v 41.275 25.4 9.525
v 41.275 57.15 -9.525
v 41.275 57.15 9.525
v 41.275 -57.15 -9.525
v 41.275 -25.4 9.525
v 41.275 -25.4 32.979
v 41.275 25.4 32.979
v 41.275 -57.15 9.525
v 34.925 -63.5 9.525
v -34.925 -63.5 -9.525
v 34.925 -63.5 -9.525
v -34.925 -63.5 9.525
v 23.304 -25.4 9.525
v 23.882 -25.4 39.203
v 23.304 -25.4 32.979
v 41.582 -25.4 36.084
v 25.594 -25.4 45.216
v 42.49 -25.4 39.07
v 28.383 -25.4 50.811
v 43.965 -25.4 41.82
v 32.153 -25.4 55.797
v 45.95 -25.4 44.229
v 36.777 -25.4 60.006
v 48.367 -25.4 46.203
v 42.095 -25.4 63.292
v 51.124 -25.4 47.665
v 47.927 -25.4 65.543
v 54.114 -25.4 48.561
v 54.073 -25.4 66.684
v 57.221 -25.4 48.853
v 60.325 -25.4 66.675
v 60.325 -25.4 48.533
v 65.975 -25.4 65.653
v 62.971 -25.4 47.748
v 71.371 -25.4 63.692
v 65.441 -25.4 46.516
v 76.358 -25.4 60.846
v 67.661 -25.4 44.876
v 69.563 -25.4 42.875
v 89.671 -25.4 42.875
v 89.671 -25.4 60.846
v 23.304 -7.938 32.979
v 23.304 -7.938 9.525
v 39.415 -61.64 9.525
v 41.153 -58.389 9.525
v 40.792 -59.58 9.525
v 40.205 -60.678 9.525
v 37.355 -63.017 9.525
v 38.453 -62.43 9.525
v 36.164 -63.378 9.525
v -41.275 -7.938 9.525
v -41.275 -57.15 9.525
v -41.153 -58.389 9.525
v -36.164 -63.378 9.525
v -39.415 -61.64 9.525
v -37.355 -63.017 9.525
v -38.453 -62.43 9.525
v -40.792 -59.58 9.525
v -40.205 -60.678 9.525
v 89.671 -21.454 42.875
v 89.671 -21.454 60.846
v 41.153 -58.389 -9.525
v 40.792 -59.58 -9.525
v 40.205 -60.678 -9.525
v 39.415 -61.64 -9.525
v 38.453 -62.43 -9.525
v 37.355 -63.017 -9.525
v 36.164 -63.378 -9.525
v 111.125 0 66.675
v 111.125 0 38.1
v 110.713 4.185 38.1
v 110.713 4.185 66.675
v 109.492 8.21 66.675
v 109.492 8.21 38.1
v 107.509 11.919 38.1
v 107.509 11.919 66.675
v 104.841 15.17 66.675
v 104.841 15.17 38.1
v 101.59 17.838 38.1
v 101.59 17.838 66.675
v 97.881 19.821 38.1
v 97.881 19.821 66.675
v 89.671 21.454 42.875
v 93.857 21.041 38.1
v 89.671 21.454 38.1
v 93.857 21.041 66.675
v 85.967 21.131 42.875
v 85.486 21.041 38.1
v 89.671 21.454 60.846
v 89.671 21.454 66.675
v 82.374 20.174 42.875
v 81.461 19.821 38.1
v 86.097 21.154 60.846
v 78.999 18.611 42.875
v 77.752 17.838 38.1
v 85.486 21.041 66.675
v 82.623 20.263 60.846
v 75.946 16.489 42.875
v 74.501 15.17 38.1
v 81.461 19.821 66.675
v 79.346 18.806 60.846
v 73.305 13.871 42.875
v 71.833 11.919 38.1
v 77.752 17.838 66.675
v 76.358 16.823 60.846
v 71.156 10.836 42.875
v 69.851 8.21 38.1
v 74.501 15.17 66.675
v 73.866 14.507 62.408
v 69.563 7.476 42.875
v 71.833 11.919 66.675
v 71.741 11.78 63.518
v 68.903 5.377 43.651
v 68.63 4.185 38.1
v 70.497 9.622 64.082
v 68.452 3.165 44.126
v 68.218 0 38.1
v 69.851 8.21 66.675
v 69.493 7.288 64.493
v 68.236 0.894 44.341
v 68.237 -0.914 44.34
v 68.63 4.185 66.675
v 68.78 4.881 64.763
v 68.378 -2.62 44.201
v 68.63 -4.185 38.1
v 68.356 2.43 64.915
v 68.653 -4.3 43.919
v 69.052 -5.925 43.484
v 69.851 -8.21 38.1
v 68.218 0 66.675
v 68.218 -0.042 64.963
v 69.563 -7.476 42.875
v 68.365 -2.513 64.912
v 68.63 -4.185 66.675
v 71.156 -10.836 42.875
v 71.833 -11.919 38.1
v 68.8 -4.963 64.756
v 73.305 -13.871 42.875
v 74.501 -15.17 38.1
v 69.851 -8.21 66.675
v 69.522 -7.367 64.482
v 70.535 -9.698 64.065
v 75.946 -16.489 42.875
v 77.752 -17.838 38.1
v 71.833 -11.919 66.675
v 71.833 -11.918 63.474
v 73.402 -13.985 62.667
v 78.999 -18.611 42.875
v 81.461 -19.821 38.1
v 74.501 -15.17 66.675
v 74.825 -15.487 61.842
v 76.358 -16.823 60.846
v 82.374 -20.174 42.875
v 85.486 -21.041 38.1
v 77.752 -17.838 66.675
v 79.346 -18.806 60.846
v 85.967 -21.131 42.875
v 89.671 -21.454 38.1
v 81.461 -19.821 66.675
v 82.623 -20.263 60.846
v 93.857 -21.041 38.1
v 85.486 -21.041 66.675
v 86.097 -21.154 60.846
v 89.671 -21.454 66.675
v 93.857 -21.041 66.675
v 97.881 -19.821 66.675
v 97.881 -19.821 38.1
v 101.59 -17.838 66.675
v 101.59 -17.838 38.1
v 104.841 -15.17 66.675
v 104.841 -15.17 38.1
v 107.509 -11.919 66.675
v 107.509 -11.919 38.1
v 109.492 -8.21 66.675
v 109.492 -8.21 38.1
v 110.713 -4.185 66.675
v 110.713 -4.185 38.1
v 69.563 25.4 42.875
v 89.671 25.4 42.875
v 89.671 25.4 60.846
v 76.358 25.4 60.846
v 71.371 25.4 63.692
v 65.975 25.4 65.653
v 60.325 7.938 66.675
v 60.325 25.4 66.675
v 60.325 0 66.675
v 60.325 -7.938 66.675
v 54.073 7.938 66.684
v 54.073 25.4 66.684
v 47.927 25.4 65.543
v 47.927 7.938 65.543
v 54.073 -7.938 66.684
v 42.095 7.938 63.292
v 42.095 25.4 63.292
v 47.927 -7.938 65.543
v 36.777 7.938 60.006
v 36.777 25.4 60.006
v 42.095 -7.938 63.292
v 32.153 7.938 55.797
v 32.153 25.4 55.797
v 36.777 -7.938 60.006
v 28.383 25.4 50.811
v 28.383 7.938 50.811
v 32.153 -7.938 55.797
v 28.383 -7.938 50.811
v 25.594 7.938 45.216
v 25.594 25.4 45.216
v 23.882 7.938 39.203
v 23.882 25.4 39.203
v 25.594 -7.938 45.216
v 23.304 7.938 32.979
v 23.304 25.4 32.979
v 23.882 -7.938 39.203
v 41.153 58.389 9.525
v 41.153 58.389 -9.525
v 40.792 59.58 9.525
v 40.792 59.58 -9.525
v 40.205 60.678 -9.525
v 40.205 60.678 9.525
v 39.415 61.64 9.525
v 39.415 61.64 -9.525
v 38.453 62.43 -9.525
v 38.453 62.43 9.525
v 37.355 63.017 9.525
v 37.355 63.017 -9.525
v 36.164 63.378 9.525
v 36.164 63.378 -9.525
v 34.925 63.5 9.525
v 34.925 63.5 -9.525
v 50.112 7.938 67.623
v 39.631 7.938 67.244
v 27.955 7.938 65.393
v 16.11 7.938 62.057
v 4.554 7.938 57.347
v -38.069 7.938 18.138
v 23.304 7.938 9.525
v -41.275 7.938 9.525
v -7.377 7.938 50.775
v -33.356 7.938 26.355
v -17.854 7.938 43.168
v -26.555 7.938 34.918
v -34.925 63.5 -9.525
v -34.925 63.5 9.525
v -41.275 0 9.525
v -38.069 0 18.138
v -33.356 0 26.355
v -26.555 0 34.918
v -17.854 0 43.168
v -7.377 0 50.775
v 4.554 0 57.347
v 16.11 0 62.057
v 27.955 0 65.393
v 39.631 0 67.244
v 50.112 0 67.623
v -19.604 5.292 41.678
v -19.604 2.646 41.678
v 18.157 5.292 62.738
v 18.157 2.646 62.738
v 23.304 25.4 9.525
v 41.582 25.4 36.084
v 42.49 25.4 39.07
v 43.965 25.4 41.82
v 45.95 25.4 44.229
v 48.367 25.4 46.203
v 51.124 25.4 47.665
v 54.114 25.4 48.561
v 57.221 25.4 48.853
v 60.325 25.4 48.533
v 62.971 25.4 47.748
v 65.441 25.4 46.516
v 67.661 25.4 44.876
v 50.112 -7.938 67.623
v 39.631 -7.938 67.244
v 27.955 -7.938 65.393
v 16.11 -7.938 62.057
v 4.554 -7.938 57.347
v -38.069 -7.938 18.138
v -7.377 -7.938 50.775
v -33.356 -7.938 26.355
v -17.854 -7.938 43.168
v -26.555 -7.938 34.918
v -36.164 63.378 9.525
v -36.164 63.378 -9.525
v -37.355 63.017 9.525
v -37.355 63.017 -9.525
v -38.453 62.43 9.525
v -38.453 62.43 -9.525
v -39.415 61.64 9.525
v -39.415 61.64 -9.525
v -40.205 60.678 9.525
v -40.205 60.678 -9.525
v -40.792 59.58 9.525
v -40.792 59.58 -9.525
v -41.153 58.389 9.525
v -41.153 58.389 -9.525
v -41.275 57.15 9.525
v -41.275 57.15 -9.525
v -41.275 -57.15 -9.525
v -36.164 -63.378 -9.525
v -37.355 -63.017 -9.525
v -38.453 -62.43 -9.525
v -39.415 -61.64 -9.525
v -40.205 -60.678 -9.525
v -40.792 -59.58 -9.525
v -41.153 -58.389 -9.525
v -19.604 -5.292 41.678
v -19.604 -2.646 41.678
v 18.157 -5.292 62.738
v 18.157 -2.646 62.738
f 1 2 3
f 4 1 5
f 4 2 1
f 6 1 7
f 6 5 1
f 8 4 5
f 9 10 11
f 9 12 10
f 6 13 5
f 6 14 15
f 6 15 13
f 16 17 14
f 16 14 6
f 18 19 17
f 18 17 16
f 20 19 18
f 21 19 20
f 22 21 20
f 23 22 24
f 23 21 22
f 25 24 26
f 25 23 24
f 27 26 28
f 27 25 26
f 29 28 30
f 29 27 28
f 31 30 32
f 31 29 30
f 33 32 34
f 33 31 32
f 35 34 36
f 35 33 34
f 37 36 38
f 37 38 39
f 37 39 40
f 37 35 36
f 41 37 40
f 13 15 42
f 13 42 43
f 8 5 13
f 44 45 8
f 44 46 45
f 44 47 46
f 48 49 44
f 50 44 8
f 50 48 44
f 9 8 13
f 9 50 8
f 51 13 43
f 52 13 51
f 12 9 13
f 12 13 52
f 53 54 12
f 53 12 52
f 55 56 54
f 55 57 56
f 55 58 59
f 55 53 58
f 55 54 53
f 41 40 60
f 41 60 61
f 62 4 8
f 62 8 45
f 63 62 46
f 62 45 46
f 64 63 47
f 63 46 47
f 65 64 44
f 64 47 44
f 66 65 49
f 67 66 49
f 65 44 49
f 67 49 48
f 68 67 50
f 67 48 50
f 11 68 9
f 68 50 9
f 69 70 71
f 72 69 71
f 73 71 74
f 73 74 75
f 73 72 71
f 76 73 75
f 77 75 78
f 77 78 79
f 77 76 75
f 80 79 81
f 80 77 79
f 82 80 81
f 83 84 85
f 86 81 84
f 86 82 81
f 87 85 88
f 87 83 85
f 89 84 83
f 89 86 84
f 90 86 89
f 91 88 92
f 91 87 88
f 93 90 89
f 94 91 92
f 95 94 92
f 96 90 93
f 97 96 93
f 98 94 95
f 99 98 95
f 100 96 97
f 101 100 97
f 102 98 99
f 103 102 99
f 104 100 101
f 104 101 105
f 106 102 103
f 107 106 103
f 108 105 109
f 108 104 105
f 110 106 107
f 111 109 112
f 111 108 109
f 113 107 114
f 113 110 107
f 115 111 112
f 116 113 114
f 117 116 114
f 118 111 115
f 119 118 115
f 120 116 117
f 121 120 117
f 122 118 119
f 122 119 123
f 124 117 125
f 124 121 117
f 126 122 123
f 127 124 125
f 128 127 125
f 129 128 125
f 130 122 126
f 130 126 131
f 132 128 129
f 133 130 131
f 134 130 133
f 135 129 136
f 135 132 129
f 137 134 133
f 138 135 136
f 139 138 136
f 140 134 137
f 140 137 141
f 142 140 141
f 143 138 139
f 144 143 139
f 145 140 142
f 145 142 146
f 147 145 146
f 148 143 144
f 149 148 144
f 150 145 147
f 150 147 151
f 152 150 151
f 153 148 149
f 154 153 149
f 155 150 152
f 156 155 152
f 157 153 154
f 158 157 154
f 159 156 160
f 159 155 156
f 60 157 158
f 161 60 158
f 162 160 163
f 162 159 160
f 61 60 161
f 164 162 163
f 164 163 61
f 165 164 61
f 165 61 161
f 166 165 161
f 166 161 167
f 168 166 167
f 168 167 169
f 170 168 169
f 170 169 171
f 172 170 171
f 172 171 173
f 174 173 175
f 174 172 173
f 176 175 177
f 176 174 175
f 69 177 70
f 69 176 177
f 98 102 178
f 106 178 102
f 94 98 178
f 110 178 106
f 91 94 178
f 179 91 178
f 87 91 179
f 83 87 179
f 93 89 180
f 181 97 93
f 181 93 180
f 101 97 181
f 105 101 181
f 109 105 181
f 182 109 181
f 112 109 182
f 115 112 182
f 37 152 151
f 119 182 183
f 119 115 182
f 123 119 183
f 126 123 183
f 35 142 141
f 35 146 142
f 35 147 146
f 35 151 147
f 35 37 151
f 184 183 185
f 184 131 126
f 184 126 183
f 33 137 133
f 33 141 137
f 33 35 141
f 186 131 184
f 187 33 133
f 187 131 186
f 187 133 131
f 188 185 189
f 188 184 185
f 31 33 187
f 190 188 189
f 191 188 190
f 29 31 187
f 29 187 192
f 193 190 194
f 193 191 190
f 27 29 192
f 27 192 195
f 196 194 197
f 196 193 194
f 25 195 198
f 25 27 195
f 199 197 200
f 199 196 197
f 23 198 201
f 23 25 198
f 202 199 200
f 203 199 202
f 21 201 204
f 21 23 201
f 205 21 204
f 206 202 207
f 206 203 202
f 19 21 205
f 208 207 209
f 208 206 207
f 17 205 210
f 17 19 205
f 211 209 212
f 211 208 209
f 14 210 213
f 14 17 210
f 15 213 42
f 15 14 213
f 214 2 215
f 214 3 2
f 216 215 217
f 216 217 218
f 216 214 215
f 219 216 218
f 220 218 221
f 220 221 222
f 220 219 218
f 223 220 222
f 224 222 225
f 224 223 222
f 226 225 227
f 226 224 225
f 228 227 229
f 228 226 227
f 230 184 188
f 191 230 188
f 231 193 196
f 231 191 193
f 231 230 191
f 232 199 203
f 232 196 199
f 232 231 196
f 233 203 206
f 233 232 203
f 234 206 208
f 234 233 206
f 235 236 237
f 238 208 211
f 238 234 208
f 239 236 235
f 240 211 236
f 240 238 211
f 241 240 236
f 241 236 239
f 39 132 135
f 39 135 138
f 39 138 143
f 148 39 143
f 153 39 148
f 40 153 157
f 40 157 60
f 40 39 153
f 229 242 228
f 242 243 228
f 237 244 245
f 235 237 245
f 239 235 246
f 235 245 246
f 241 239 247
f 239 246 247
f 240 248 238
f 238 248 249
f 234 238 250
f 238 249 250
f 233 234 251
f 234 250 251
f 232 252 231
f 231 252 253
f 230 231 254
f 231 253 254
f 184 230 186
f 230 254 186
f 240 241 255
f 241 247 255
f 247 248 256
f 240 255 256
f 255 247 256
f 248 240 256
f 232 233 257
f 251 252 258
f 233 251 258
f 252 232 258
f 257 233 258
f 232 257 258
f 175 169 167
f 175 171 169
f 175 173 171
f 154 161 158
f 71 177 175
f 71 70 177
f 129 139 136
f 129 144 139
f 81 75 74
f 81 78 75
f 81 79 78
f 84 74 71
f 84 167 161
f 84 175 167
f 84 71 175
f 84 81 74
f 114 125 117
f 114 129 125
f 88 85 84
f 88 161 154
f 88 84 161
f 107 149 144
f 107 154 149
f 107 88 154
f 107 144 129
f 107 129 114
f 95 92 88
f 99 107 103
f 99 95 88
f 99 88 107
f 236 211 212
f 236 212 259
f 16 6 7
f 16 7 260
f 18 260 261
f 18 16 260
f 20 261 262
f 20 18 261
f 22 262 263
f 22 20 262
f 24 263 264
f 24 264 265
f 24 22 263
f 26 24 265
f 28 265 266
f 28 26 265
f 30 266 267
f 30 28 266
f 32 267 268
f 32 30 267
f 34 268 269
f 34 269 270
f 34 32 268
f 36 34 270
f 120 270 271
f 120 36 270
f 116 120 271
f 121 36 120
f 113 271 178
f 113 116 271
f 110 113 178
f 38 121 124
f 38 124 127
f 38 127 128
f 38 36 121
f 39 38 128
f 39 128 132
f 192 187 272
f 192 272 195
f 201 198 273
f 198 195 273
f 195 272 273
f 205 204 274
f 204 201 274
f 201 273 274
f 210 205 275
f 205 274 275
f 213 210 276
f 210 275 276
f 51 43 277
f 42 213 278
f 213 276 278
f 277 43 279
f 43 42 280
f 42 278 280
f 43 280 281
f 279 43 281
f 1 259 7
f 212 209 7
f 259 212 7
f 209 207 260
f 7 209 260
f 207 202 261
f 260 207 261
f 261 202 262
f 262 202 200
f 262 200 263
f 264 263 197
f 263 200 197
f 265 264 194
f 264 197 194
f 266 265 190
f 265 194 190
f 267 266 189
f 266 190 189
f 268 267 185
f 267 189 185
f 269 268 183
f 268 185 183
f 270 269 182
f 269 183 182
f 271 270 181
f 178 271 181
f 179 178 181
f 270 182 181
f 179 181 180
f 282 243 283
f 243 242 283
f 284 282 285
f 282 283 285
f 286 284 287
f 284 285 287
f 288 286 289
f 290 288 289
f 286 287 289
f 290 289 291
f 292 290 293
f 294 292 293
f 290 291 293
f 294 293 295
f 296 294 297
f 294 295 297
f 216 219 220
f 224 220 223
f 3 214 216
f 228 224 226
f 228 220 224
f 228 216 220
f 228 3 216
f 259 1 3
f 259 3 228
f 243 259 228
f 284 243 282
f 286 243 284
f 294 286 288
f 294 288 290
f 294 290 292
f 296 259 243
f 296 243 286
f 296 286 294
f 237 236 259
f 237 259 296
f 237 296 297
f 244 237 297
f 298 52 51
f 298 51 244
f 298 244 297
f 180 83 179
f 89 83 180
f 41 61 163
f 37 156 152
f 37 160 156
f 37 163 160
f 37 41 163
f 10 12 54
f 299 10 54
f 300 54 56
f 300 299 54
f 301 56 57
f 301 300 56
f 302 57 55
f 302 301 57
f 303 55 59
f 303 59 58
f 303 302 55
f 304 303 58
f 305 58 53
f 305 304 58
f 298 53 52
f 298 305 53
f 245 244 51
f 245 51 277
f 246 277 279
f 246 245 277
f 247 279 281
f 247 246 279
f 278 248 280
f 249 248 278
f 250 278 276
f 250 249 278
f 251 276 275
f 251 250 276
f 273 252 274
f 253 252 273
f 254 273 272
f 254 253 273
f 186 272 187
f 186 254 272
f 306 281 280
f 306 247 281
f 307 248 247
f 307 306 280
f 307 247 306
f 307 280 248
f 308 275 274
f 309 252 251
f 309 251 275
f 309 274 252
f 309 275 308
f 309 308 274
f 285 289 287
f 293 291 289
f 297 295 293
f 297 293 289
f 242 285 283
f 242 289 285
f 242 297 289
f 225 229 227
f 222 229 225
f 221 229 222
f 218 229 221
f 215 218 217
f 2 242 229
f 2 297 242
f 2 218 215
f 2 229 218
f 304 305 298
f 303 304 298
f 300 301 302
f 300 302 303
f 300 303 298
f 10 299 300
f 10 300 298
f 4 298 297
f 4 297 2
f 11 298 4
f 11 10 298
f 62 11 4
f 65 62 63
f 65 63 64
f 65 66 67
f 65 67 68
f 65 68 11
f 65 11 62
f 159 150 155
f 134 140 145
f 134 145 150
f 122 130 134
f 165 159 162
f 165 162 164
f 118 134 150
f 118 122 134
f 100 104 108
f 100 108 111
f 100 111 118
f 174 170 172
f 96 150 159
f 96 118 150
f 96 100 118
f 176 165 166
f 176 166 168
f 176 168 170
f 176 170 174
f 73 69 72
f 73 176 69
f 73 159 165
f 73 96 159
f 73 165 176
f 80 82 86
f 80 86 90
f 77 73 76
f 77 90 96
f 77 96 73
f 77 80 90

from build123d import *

# Parameters (mm, degrees)
F1_DEPTH = 63.5
F2_DEPTH = 25.4
F3_DEPTH = 7.9375
F5_R     = 6.35


with BuildPart() as f1:
    # F0 (on Front) → F1 (new body, symmetric)
    with BuildSketch(Plane.XZ):
        Polygon((-41.275, 9.525), (-41.275, -9.525), (41.275, -9.525), (41.275, 9.525), (23.3043469489, 9.525), align=None)
    extrude(amount=F1_DEPTH, both=True)

    # F0 (on Front) → F2 (join, symmetric)
    with BuildSketch(Plane.XZ):
        with BuildLine():
            Line((23.3043469489, 9.525), (41.275, 9.525))
            Line((41.275, 9.525), (41.275, 32.9785965501))
            ThreePointArc((41.275, 32.9785965501), (47.109768429, 45.2753186743), (60.325, 48.5328564168))
            Line((60.325, 48.5328564168), (60.325, 66.675))
            ThreePointArc((60.325, 66.675), (34.3676792005, 58.0084605019), (23.3043469489, 32.9785965501))
            Line((23.3043469489, 32.9785965501), (23.3043469489, 9.525))
        make_face()
        with BuildLine():
            ThreePointArc((76.3579214275, 60.8458530511), (68.7147538428, 64.787159847), (60.325, 66.675))
            Line((60.325, 66.675), (60.325, 48.5328564168))
            ThreePointArc((60.325, 48.5328564168), (65.4413001724, 46.5163203784), (69.5626091196, 42.8752))
            Line((69.5626091196, 42.8752), (89.6713504766, 42.8752))
            Line((89.6713504766, 42.8752), (89.6713504766, 60.8458530511))
            Line((89.6713504766, 60.8458530511), (76.3579214275, 60.8458530511))
        make_face()
    extrude(amount=F2_DEPTH, both=True)

    # F0 (on Front) → F3 (join, symmetric)
    with BuildSketch(Plane.XZ):
        with BuildLine():
            add(Edge.make_bspline(
                [(-41.275, 9.525), (-31.5447561443, 45.2147647738), (19.8492854834, 73.3103826642), (60.325, 66.675)],
                knots=[0, 0, 0, 0, 116.5705044169, 116.5705044169, 116.5705044169, 116.5705044169], degree=3))
            Line((-41.275, 9.525), (23.3043469489, 9.525))
            Line((23.3043469489, 9.525), (23.3043469489, 32.9785965501))
            ThreePointArc((23.3043469489, 32.9785965501), (34.3676792005, 58.0084605019), (60.325, 66.675))
        make_face()
    extrude(amount=F3_DEPTH, both=True)

    # F0 (on Front) → F4 (revolve)
    with BuildSketch(Plane.XZ):
        Polygon((111.125, 66.675), (89.6713504766, 66.675), (89.6713504766, 60.8458530511), (89.6713504766, 42.8752), (89.6713504766, 38.1), (111.125, 38.1), align=None)
    revolve(axis=Axis((89.6713504766, 0, 52.3875), (0, 0, 1)))

    # F5
    f5_edges = [f1.edges().sort_by_distance(p)[0] for p in [
        (-41.275, -63.5, 0),
        (41.275, -63.5, 0),
        (-41.275, 63.5, 0),
        (41.275, 63.5, 0),
    ]]
    fillet(f5_edges, radius=F5_R)


solid = f1.part
